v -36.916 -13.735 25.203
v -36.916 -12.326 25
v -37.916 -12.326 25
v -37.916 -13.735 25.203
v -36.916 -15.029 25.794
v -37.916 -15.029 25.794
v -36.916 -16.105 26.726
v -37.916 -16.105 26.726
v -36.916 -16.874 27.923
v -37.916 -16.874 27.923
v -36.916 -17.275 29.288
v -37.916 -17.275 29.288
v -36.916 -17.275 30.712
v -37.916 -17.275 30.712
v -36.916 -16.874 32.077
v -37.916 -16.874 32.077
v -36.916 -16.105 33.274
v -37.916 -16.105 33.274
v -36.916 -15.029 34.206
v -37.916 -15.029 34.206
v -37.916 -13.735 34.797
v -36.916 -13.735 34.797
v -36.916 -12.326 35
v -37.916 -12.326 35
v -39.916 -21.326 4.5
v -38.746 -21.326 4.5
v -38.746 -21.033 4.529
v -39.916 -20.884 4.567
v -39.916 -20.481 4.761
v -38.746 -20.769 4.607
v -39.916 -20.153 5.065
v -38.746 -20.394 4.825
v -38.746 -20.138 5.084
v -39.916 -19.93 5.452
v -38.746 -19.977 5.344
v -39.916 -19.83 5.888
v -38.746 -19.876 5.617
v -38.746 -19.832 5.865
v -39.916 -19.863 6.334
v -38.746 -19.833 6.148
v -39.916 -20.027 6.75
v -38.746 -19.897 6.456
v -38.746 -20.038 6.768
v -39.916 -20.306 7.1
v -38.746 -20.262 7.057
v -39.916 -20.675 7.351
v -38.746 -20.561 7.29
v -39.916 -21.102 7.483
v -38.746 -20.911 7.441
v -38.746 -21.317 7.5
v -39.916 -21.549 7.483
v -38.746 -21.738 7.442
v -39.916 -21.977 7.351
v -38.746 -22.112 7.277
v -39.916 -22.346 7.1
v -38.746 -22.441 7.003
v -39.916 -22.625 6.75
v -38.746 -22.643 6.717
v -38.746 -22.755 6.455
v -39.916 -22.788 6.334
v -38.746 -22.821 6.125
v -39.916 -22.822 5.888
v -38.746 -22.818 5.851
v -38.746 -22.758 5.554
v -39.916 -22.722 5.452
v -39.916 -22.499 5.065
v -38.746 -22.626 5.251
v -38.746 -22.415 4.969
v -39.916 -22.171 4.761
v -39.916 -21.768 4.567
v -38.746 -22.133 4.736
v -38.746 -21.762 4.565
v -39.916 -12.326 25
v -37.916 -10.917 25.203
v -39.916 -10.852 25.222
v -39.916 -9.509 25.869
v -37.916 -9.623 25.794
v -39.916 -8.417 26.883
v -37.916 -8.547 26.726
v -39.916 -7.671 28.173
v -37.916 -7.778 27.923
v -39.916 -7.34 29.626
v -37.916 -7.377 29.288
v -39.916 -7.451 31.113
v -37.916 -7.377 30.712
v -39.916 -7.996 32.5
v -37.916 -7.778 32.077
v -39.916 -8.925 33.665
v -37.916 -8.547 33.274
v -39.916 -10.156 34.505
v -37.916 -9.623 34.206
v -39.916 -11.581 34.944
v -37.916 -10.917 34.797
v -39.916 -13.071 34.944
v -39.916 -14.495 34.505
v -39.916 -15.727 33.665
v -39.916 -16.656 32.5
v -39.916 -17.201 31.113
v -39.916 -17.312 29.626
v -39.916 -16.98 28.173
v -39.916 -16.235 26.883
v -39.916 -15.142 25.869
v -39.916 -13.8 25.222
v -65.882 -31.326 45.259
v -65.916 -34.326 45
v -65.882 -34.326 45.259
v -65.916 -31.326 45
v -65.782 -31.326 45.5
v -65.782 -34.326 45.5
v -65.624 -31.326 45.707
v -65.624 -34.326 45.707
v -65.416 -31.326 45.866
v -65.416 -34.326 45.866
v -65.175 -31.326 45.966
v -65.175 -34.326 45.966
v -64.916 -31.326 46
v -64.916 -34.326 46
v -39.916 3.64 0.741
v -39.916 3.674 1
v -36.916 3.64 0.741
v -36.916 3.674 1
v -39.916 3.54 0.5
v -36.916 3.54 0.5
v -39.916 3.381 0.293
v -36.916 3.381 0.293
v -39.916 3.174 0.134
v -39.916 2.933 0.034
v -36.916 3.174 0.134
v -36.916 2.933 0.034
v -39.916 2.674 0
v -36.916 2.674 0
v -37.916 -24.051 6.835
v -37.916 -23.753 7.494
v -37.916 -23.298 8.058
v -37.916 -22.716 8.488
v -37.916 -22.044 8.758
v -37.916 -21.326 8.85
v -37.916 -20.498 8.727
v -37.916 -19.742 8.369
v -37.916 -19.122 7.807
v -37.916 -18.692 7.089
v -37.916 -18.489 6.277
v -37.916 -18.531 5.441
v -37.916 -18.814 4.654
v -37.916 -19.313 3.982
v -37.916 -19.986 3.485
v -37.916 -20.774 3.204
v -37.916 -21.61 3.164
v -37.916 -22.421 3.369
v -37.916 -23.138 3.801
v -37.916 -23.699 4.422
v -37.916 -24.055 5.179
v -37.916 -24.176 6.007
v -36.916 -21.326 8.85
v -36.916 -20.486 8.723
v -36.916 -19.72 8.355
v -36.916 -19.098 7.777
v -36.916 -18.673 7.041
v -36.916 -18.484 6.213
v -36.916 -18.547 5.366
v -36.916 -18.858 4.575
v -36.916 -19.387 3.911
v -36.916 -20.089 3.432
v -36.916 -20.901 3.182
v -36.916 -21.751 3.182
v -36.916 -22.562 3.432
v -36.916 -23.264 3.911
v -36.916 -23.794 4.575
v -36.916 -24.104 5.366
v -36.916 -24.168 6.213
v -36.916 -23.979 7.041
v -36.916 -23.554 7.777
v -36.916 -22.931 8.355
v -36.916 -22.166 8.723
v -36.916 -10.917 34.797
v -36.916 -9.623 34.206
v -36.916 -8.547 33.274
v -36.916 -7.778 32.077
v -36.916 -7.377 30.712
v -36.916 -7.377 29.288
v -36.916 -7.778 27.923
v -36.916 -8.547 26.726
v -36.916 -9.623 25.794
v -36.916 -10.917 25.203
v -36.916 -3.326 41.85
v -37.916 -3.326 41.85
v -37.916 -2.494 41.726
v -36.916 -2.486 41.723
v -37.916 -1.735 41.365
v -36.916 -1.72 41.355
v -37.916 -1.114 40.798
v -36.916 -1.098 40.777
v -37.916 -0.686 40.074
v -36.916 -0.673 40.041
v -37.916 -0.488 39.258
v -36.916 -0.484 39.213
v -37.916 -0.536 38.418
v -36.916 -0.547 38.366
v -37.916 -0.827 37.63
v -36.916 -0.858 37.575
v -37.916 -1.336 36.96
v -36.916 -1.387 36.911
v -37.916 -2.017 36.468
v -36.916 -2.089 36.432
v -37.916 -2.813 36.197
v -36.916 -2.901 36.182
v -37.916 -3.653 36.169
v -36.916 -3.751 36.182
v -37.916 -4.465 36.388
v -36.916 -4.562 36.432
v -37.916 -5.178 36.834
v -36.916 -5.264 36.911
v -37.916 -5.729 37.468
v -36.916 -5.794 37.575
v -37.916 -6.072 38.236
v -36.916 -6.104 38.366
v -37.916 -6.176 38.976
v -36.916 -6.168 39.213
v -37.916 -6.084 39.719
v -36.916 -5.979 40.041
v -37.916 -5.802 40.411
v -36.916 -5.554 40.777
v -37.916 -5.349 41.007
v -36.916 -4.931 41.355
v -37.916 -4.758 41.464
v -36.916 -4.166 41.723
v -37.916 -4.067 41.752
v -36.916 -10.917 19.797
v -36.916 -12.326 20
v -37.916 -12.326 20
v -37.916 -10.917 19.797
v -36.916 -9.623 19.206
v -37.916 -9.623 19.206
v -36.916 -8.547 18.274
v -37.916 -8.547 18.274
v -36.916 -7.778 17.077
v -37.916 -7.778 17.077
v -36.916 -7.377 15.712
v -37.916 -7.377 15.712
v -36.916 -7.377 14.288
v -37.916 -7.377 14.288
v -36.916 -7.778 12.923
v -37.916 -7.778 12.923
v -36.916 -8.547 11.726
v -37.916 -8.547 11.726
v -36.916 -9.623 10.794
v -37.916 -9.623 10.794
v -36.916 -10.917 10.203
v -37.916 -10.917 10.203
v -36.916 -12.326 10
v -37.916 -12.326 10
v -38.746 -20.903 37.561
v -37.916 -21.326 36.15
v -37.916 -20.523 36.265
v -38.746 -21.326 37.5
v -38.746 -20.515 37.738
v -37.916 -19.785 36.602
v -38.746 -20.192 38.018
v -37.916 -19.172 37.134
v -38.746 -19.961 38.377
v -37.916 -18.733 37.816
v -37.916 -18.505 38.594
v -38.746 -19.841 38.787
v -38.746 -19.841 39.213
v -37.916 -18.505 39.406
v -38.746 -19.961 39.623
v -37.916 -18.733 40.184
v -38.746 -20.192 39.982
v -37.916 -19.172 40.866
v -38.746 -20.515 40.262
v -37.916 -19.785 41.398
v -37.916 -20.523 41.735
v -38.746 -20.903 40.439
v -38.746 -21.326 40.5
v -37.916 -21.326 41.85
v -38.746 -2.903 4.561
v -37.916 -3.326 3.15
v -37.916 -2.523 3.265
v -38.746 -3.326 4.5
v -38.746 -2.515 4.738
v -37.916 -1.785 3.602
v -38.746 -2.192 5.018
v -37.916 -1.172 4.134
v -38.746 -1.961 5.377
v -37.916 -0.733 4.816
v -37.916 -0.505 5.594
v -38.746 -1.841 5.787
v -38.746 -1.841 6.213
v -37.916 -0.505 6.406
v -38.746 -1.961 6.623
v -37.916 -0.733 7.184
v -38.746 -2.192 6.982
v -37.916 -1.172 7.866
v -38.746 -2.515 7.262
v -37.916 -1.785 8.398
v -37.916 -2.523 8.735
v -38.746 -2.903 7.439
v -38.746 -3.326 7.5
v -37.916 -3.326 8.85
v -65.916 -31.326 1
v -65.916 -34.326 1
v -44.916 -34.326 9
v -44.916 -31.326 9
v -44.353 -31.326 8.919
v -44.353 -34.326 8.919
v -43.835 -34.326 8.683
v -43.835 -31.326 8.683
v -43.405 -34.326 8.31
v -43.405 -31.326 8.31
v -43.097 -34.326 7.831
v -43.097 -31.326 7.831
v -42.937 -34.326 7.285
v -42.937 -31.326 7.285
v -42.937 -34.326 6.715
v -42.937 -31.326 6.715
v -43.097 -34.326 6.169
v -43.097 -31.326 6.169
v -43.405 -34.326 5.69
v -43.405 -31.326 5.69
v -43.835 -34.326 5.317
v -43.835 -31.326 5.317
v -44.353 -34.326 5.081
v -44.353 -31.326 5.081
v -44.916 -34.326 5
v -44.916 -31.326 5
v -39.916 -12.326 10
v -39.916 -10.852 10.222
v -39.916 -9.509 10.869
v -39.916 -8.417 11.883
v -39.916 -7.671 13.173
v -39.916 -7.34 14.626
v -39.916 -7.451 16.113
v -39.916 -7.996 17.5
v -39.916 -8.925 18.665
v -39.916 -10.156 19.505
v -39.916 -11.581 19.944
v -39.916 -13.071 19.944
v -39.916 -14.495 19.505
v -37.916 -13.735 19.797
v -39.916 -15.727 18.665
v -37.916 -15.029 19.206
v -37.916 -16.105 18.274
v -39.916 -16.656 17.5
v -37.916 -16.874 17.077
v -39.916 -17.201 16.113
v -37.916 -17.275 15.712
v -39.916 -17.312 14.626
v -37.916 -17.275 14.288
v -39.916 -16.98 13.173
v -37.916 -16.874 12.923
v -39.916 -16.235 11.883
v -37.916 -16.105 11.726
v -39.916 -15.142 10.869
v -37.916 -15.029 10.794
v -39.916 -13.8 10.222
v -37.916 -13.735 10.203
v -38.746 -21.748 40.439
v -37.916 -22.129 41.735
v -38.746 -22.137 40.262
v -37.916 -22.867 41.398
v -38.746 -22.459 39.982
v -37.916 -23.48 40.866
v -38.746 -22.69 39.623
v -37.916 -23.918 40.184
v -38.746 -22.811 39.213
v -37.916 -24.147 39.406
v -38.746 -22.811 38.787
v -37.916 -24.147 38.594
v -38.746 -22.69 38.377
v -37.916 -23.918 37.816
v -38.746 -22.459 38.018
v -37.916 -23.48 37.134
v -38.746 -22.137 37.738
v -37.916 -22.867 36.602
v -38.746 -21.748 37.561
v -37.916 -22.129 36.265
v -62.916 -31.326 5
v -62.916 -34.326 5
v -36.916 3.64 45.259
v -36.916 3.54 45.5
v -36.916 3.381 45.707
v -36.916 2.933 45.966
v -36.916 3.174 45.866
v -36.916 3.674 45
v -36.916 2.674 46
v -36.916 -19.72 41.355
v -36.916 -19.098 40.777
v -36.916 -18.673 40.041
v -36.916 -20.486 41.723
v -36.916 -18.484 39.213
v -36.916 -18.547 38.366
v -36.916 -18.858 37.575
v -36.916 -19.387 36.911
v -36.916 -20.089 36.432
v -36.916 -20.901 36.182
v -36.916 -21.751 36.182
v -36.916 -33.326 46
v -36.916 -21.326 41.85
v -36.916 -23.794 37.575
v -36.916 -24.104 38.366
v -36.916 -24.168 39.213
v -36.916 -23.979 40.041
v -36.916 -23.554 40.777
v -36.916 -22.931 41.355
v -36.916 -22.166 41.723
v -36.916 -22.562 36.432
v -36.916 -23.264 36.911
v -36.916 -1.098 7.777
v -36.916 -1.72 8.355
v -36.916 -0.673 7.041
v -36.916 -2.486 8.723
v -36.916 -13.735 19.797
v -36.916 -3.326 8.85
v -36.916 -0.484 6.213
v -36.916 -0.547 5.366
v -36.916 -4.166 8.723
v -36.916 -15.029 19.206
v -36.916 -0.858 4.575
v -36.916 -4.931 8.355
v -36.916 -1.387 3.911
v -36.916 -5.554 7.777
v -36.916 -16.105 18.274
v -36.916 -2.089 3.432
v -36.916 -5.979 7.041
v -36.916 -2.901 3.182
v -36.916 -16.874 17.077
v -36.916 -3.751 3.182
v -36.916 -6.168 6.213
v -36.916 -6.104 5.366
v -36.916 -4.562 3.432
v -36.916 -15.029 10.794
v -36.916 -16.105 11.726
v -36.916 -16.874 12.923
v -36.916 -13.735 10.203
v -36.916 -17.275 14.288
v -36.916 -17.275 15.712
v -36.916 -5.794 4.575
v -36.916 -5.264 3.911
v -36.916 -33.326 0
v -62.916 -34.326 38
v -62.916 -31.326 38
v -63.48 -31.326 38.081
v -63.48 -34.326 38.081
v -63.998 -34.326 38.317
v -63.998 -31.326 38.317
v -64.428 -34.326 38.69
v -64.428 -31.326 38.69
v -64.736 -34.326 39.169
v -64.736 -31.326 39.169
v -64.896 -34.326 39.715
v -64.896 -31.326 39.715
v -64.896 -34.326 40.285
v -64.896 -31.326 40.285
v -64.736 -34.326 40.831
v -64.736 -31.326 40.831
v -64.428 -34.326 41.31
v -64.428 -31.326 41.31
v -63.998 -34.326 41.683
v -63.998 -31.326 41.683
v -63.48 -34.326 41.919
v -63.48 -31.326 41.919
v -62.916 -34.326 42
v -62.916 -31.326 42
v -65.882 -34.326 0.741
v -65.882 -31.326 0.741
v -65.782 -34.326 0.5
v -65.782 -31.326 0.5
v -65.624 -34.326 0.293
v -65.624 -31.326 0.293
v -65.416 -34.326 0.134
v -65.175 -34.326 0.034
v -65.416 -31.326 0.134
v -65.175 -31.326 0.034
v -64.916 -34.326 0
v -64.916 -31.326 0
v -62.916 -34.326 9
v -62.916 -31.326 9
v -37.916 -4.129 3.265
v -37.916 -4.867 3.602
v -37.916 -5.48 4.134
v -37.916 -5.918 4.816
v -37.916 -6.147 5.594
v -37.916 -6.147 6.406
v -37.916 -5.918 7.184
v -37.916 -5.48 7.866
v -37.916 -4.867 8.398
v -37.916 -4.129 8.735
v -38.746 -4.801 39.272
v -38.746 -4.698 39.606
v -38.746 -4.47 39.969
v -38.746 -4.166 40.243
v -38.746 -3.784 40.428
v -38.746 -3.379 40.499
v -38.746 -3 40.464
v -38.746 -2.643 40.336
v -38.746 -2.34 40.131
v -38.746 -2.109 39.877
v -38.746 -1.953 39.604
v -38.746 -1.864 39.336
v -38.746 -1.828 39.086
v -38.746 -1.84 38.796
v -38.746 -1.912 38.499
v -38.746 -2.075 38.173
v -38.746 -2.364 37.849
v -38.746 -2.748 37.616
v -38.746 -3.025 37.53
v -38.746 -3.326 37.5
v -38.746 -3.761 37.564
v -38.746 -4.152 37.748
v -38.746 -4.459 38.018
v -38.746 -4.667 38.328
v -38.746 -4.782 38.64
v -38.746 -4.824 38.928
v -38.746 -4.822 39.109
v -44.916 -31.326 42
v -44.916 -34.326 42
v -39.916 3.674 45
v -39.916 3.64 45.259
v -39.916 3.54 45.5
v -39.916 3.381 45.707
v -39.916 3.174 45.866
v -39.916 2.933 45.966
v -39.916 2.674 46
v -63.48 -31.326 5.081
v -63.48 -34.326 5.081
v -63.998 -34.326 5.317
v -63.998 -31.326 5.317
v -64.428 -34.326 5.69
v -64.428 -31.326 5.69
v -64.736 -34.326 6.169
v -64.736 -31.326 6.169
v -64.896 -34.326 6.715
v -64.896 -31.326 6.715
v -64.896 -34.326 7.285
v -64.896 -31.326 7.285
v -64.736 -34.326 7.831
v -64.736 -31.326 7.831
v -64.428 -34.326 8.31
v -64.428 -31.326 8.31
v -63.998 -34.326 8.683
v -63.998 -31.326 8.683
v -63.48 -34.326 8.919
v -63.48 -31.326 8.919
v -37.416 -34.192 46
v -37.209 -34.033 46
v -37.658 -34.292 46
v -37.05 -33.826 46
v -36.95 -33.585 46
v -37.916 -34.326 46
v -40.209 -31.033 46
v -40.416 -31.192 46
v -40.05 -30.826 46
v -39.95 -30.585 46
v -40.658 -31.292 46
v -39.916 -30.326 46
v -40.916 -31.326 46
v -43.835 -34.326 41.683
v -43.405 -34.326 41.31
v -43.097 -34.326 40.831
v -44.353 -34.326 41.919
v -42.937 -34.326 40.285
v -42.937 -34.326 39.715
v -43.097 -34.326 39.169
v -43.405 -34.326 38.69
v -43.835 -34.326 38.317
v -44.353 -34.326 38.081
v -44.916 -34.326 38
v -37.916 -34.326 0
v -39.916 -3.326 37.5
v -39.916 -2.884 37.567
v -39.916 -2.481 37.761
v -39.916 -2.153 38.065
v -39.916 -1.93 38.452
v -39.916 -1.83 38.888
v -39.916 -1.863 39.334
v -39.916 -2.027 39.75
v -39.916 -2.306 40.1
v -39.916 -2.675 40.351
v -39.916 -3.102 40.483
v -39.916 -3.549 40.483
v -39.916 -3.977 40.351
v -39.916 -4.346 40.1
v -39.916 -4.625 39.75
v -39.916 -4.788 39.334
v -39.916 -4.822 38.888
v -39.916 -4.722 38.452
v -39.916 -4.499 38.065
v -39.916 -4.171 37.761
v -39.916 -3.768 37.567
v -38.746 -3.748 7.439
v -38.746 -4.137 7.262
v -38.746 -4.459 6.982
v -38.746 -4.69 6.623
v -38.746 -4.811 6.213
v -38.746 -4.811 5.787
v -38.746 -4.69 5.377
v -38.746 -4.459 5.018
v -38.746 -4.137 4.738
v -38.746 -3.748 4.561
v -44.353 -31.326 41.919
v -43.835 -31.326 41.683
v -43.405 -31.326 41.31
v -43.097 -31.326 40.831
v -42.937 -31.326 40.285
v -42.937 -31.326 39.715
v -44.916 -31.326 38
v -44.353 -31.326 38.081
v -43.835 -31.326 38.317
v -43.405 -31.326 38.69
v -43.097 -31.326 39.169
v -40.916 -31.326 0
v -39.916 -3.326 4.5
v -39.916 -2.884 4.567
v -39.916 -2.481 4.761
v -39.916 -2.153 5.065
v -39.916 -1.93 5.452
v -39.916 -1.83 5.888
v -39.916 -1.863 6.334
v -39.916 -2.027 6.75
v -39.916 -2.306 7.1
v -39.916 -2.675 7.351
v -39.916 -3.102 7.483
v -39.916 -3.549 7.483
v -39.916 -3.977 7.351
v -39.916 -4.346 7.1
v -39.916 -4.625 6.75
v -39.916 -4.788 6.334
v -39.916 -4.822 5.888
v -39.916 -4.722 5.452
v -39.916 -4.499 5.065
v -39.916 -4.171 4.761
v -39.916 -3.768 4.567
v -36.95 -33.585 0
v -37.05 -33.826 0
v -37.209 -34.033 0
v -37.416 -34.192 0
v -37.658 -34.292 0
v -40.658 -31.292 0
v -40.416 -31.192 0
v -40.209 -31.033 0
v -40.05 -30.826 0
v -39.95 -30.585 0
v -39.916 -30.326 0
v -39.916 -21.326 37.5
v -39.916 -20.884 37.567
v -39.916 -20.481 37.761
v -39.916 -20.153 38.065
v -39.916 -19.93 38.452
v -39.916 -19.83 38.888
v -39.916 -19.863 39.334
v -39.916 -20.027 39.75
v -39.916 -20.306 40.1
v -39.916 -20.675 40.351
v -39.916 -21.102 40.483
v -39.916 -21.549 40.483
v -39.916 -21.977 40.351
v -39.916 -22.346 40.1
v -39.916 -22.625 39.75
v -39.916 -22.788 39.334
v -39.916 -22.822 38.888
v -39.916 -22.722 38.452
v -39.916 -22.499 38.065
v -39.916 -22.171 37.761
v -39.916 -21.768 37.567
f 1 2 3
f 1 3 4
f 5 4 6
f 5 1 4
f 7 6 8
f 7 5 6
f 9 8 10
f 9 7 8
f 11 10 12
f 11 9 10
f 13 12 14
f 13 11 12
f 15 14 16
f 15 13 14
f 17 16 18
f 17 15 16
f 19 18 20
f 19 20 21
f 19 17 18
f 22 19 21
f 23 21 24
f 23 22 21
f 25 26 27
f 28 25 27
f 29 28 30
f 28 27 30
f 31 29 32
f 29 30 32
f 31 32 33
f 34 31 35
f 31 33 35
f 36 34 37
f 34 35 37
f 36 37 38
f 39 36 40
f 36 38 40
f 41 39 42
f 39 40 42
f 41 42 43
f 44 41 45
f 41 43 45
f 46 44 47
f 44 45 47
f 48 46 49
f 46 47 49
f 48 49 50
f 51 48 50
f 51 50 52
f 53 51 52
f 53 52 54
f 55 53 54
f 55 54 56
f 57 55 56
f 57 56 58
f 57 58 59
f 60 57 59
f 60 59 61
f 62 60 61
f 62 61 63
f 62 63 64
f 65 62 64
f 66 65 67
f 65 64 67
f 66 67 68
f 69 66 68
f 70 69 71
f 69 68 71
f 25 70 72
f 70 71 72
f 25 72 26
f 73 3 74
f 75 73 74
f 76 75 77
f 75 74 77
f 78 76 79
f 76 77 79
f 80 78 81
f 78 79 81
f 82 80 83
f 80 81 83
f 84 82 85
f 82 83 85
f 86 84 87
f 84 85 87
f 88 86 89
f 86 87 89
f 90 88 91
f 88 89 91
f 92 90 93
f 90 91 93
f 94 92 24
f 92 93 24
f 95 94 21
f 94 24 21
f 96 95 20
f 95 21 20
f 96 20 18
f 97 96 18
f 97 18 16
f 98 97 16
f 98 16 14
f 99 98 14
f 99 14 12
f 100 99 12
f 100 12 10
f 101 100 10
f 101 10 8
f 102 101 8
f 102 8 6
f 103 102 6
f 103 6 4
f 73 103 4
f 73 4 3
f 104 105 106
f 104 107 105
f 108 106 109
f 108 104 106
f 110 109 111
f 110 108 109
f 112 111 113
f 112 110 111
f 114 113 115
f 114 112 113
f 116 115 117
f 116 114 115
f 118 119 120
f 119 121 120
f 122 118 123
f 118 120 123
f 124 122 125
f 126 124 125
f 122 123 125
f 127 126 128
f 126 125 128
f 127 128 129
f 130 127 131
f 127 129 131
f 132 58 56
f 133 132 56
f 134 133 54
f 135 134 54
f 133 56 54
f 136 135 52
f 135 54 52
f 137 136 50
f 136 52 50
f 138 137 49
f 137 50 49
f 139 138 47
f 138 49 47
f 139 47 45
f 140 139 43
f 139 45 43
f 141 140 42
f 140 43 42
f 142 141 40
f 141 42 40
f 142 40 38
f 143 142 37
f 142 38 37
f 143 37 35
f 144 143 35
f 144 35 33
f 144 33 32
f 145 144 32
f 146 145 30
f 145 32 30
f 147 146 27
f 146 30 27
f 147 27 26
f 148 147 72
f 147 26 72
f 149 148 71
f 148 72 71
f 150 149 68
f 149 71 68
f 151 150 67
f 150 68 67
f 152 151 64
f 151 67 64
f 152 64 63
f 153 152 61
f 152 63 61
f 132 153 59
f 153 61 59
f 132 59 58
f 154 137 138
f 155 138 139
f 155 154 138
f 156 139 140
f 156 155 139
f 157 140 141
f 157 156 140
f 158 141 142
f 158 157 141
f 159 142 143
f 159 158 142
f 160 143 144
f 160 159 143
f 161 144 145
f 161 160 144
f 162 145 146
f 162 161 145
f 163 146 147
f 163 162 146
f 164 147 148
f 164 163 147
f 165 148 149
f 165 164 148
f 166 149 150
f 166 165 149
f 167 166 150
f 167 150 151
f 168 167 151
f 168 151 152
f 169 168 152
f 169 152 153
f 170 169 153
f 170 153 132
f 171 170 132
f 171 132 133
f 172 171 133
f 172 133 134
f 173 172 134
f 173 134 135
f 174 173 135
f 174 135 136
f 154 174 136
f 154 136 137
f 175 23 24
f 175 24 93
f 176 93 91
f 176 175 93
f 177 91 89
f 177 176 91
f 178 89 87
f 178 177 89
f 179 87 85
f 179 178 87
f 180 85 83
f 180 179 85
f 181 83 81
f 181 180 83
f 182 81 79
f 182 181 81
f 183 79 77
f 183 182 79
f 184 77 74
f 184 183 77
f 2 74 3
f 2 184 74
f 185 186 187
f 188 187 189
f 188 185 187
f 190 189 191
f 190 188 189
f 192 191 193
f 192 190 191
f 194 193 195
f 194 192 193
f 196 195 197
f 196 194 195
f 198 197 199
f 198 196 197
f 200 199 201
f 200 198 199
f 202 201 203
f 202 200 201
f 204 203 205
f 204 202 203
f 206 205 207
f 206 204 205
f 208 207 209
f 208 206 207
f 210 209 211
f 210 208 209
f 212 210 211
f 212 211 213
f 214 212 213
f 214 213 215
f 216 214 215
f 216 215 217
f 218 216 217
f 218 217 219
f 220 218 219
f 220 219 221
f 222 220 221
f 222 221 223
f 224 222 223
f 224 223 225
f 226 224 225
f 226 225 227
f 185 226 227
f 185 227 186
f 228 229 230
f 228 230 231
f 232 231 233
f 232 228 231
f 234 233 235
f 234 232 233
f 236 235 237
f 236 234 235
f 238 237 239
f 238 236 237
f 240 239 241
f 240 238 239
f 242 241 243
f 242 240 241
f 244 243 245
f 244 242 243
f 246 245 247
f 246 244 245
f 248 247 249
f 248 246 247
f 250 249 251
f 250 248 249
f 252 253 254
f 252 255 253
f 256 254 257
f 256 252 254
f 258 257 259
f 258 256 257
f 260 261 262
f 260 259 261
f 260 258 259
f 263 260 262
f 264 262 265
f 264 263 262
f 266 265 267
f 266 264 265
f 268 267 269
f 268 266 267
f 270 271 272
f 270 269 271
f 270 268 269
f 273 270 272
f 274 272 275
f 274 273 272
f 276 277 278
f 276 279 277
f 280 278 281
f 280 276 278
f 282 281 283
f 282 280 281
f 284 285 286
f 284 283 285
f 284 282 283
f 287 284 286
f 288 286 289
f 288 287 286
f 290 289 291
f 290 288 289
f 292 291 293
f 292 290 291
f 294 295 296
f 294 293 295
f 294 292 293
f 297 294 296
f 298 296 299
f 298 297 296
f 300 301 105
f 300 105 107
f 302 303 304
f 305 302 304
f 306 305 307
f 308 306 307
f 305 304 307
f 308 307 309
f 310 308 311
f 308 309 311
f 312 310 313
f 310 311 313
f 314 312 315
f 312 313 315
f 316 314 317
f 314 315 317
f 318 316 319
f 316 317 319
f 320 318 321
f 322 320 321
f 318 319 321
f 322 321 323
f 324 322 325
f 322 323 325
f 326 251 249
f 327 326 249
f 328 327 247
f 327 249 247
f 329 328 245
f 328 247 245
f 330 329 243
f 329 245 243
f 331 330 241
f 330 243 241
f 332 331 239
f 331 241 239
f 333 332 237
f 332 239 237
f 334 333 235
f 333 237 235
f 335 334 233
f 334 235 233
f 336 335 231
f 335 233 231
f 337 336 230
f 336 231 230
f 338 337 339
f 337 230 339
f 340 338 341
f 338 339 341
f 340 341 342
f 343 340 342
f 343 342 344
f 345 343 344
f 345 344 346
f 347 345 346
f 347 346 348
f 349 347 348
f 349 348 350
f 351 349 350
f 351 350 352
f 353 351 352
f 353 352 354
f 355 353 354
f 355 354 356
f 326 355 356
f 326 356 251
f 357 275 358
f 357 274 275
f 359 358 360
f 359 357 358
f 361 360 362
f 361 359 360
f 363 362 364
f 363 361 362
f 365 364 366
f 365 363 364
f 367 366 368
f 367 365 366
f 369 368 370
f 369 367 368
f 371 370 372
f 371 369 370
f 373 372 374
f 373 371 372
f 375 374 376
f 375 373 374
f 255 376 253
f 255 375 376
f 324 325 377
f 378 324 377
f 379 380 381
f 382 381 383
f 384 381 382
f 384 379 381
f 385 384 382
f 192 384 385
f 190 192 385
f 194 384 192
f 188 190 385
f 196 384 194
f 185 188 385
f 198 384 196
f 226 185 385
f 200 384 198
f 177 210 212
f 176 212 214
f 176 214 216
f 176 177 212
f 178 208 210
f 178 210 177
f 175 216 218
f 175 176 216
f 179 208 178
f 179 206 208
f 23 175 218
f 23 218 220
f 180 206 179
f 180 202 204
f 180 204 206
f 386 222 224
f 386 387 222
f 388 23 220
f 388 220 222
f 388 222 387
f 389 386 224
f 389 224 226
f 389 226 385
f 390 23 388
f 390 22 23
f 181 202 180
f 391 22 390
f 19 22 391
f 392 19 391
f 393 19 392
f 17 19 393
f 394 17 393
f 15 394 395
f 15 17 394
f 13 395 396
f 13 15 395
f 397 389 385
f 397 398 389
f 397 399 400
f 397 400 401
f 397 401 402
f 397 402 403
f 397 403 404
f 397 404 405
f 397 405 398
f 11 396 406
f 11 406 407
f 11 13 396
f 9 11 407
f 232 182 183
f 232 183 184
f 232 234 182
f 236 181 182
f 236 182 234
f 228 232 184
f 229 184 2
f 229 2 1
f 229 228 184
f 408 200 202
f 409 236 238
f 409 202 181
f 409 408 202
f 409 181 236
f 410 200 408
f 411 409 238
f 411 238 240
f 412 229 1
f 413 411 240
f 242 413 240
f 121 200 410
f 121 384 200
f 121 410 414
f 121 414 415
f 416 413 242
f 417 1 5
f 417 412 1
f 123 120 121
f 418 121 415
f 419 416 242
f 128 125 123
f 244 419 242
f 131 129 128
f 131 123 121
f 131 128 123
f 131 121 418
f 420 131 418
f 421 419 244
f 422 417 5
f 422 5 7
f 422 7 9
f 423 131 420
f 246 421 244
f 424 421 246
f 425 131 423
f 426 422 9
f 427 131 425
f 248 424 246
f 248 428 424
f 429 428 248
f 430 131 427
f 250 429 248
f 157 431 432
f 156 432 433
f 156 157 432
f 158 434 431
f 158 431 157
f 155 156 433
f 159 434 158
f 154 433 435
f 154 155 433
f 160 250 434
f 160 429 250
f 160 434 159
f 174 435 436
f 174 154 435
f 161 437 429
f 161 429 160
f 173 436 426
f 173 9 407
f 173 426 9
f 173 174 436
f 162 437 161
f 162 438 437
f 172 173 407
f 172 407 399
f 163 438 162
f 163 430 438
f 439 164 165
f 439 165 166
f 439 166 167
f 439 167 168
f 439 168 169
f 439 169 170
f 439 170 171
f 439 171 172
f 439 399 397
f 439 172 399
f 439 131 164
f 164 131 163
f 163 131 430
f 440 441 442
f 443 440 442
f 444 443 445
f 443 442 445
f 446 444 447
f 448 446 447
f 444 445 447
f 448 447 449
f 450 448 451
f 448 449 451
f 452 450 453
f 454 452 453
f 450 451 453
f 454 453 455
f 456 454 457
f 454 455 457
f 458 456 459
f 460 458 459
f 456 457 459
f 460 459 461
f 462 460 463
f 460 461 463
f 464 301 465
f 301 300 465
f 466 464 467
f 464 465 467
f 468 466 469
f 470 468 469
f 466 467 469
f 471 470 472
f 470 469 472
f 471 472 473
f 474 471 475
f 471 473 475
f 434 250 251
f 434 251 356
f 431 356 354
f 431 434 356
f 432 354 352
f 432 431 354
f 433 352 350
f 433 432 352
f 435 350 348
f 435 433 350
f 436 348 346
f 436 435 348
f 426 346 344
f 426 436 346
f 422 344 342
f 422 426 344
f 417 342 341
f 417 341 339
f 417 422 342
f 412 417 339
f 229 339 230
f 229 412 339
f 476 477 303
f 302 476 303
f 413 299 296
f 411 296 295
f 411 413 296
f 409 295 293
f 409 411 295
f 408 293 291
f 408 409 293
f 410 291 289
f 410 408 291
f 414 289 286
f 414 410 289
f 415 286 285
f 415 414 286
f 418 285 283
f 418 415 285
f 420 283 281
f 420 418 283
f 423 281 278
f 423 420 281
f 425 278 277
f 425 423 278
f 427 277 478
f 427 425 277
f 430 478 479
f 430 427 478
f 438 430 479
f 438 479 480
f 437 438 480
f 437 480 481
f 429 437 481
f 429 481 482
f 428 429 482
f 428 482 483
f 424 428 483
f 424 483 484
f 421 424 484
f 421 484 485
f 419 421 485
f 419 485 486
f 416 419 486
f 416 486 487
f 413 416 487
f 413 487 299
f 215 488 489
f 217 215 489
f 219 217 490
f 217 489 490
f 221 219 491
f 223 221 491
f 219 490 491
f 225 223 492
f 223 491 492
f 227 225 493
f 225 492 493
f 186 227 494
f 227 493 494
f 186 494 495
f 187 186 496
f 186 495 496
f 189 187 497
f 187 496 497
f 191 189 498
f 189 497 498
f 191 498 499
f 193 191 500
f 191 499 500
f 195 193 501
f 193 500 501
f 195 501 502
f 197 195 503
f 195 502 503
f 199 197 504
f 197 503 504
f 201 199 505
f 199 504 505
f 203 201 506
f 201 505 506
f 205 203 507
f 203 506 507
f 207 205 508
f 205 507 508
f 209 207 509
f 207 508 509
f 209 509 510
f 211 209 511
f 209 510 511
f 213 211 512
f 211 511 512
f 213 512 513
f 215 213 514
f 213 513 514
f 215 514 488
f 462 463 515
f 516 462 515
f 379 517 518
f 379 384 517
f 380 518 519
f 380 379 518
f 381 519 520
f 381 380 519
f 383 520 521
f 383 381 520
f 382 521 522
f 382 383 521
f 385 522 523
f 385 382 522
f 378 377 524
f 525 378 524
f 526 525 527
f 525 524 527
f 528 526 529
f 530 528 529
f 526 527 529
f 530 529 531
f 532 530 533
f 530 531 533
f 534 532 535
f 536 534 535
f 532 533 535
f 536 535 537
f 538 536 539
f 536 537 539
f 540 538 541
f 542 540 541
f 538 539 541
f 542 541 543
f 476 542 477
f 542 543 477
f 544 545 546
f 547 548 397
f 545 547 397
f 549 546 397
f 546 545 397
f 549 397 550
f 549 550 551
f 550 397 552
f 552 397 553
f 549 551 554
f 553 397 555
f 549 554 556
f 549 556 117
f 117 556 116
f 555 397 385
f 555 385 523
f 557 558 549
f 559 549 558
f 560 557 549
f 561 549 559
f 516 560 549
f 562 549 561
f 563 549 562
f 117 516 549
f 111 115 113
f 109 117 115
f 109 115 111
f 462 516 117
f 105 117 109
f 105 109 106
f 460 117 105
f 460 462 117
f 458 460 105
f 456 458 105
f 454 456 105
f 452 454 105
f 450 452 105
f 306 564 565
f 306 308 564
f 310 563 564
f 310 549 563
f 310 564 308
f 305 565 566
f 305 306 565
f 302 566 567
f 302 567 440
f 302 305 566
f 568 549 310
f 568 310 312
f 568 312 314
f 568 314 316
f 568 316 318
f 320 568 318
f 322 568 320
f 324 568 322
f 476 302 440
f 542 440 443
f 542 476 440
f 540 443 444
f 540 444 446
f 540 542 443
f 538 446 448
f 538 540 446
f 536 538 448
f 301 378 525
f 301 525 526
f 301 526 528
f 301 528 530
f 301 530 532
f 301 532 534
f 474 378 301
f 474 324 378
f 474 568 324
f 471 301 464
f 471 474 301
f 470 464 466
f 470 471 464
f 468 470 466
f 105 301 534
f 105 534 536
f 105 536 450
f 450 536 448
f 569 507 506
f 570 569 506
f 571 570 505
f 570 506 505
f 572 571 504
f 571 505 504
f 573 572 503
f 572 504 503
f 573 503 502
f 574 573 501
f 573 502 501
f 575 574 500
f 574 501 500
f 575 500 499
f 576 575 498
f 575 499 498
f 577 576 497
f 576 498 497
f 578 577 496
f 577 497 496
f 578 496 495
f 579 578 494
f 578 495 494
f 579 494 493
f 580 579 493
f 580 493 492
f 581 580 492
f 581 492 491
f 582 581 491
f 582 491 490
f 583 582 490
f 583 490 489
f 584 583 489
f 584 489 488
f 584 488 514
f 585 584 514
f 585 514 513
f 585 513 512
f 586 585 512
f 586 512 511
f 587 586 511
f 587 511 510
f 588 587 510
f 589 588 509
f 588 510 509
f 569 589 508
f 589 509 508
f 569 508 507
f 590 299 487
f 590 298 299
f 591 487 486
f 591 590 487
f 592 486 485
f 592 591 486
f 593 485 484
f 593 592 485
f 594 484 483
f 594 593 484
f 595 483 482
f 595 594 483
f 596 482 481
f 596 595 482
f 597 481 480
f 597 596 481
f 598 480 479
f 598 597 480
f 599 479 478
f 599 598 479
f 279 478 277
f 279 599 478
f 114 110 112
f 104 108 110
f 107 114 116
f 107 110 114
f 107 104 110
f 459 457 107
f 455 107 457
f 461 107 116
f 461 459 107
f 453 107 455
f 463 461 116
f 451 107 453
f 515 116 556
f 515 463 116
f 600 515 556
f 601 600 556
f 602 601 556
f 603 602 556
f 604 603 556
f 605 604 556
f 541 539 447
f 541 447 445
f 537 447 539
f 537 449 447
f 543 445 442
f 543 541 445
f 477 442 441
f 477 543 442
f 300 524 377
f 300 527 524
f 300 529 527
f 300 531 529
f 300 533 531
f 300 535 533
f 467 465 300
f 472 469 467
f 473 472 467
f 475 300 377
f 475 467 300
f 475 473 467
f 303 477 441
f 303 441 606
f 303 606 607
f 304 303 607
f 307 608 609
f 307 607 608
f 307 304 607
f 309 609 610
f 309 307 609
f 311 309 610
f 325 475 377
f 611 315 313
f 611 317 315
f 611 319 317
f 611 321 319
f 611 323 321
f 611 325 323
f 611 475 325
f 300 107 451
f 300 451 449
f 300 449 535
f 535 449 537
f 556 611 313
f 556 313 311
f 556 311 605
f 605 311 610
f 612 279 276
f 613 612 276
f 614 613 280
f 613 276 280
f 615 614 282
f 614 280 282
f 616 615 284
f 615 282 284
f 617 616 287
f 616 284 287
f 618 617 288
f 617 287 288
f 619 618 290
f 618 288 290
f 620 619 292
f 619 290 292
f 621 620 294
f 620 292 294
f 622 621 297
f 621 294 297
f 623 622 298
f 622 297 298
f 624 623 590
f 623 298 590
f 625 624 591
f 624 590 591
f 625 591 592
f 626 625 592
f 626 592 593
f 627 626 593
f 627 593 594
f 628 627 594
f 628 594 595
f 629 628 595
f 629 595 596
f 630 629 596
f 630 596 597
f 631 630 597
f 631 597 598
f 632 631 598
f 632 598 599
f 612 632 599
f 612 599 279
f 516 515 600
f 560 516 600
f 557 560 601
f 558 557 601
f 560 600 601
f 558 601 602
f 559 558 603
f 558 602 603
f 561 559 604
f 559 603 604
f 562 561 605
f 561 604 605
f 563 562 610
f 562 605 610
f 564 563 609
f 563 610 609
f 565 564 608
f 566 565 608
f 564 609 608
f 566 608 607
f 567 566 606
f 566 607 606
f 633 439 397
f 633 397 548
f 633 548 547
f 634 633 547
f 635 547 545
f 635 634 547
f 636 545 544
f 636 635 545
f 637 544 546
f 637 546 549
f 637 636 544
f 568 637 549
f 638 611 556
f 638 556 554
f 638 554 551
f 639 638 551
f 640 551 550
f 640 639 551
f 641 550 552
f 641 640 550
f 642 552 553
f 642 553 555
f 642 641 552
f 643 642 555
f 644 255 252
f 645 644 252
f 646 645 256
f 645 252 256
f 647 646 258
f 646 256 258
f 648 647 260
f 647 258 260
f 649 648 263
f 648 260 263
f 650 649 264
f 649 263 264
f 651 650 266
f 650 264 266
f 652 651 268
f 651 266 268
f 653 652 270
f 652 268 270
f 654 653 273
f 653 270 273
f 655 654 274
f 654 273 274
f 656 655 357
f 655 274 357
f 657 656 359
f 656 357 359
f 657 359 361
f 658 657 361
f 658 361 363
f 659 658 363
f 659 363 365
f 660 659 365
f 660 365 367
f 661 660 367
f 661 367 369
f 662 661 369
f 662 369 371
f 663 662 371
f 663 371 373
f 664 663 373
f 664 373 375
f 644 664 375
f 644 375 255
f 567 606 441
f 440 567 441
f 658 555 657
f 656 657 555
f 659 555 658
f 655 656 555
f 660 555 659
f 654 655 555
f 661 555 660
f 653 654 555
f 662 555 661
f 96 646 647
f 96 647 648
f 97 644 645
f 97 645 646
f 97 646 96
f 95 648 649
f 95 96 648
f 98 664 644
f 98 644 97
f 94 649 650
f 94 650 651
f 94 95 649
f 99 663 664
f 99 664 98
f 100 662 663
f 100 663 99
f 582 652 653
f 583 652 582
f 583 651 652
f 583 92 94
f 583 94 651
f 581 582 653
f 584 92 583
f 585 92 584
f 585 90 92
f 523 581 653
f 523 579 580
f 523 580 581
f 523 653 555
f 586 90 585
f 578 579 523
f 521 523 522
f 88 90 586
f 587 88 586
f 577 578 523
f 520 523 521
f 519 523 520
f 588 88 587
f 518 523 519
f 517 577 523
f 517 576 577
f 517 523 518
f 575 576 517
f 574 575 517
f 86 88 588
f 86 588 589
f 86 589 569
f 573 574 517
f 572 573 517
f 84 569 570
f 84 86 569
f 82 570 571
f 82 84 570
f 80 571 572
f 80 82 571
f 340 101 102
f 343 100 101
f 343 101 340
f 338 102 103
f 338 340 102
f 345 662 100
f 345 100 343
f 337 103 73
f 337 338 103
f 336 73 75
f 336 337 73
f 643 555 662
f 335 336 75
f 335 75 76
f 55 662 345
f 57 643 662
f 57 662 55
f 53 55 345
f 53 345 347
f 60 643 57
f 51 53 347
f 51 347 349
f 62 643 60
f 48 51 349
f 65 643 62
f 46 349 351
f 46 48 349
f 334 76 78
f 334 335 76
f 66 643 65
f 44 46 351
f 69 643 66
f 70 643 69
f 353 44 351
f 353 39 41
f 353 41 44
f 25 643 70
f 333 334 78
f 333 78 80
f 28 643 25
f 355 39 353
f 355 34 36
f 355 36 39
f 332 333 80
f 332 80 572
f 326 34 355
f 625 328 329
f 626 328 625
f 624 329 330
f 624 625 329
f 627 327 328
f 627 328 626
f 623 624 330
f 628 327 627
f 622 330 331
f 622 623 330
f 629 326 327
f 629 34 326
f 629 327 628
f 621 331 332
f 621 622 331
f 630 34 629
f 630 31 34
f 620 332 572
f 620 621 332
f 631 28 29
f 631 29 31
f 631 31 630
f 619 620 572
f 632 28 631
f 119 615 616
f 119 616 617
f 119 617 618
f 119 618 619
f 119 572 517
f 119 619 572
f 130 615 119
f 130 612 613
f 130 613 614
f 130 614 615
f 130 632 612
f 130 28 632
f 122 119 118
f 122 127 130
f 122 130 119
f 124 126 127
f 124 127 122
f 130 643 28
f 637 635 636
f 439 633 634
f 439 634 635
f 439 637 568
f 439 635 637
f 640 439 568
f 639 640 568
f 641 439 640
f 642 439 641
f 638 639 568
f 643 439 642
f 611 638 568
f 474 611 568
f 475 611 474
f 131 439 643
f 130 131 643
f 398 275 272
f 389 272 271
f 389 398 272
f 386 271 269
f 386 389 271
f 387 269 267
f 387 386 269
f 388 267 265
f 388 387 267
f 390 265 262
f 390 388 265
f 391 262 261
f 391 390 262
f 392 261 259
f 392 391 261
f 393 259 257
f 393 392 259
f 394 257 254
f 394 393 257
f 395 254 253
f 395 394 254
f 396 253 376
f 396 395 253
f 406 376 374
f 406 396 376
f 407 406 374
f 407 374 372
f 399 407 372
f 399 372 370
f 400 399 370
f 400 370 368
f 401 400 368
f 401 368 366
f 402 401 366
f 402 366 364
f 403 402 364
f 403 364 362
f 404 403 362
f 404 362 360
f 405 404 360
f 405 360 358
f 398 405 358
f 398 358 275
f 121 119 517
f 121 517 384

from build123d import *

# Parameters (mm, degrees)
SALIENTE_EXTRUIR1_DEPTH = 46
REDONDEO1_R             = 1
CROQUIS2_R              = 2.85
CROQUIS2_R_2            = 5
CORTAR_EXTRUIR1_DEPTH   = 1
CORTAR_EXTRUIR2_DEPTH   = 88.669687299
CROQUIS6_R              = 5
CORTAR_EXTRUIR3_DEPTH   = 65.306026243
CROQUIS7_3_R            = 1.5
CROQUIS7_5_R            = 1.5
CROQUIS7_6_R            = 1.5
CORTAR_EXTRUIR4_DEPTH   = 64.501763056


with BuildPart() as part:
    # Croquis1 → Saliente-Extruir1 (new body)
    with BuildSketch(Plane.XY):
        with BuildLine():
            Line((-36.916417311, 3.674134953), (-36.916417311, -33.325865047))
            ThreePointArc((-36.916417311, -33.325865047), (-37.20931053, -34.032971828), (-37.916417311, -34.325865047))
            Line((-37.916417311, -34.325865047), (-65.916417311, -34.325865047))
            Line((-65.916417311, -34.325865047), (-65.916417311, -31.325865047))
            Line((-65.916417311, -31.325865047), (-40.916417311, -31.325865047))
            ThreePointArc((-40.916417311, -31.325865047), (-40.20931053, -31.032971828), (-39.916417311, -30.325865047))
            Line((-39.916417311, -30.325865047), (-39.916417311, 3.674134953))
            Line((-39.916417311, 3.674134953), (-36.916417311, 3.674134953))
        make_face()
    extrude(amount=SALIENTE_EXTRUIR1_DEPTH)

    # Redondeo1
    redondeo1_edges = [part.edges().sort_by_distance(p)[0] for p in [
        (-38.416417311, 3.674134953, 0),
        (-65.916417311, -32.825865047, 46),
        (-38.416417311, 3.674134953, 46),
        (-65.916417311, -32.825865047, 0),
    ]]
    fillet(redondeo1_edges, radius=REDONDEO1_R)

    # Croquis2 → Cortar-Extruir1 (cut)
    with BuildSketch(Plane.ZY.offset(36.916417311)):
        with Locations((6, -3.325865047)):
            Circle(CROQUIS2_R)
        with Locations((39, -3.325865047)):
            Circle(CROQUIS2_R)
        with Locations((6, -21.325865047)):
            Circle(CROQUIS2_R)
        with Locations((39, -21.325865047)):
            Circle(CROQUIS2_R)
        with Locations((15, -12.325865047)):
            Circle(CROQUIS2_R_2)
        with Locations((30, -12.325865047)):
            Circle(CROQUIS2_R_2)
    extrude(amount=CORTAR_EXTRUIR1_DEPTH, mode=Mode.SUBTRACT)

    # Croquis3 → Cortar-Extruir2 (cut, through all)
    with BuildSketch(Plane(origin=(0, -31.325865047, 0), x_dir=(1, 0, 0), z_dir=(0, 1, 0))):
        with BuildLine():
            Line((-62.916417311, -42), (-44.916417311, -42))
            ThreePointArc((-44.916417311, -42), (-42.916417311, -40), (-44.916417311, -38))
            Line((-44.916417311, -38), (-62.916417311, -38))
            ThreePointArc((-62.916417311, -38), (-64.916417311, -40), (-62.916417311, -42))
        make_face()
        with BuildLine():
            Line((-62.916417311, -9), (-44.916417311, -9))
            ThreePointArc((-44.916417311, -9), (-42.916417311, -7), (-44.916417311, -5))
            Line((-44.916417311, -5), (-62.916417311, -5))
            ThreePointArc((-62.916417311, -5), (-64.916417311, -7), (-62.916417311, -9))
        make_face()
    extrude(amount=-CORTAR_EXTRUIR2_DEPTH, mode=Mode.SUBTRACT)

    # Croquis6 → Cortar-Extruir3 (cut, through all)
    with BuildSketch(Plane(origin=(-36.916417311, 0, 0), x_dir=(0, 0, -1), z_dir=(1, 0, 0))):
        with Locations((-30, -12.325865047)):
            Circle(CROQUIS6_R)
        with Locations((-15, -12.325865047)):
            Circle(CROQUIS6_R)
    extrude(amount=-CORTAR_EXTRUIR3_DEPTH, mode=Mode.SUBTRACT)

    # Cortar-Recubrir1: read off the stored shape, not the designer's step
    # Cortar-Recubrir1: loft between two sections, ruled curve by curve
    cortar_recubrir1_from = [
        Edge.make_bspline([(-37.916417311, -6.071519474, 38.235878437), (-37.916417311, -7.599762601, 43.727187292), (-37.916417311, -2.108453745, 45.255430419), (-37.916417311, -0.580210619, 39.764121563), (-37.916417311, 0.948032507, 34.272812708), (-37.916417311, -4.543276348, 32.744569581), (-37.916417311, -6.071519474, 38.235878437)], [0, 0, 0, 0, 0.5, 0.5, 0.5, 1, 1, 1, 1], 3, [1, 0.333333333, 0.333333333, 1, 0.333333333, 0.333333333, 1]),
    ]
    cortar_recubrir1_to = [
        Edge.make_bspline([(-38.746417311, -4.801032854, 39.271808645), (-38.746417311, -4.257415563, 42.22214426), (-38.746417311, -1.307079948, 41.67852697), (-38.746417311, -1.850697239, 38.728191355), (-38.746417311, -2.39431453, 35.77785574), (-38.746417311, -5.344650145, 36.32147303), (-38.746417311, -4.801032854, 39.271808645)], [0, 0, 0, 0, 0.5, 0.5, 0.5, 1, 1, 1, 1], 3, [1, 0.333333333, 0.333333333, 1, 0.333333333, 0.333333333, 1]),
    ]
    cortar_recubrir1 = Solid(Shell([*[Face.make_surface_from_curves(cortar_recubrir1_from[k], cortar_recubrir1_to[k]) for k in range(1)], Face(Wire(cortar_recubrir1_from)), Face(Wire(cortar_recubrir1_to))]))
    add(cortar_recubrir1, mode=Mode.SUBTRACT)

    # Croquis7<3> → section 1 of cortar_recubrir2
    with BuildSketch(Plane(origin=(-38.746417311, 0, 0), x_dir=(0, 0, -1), z_dir=(1, 0, 0)), mode=Mode.PRIVATE) as cortar_recubrir2_s1:
        with Locations((-39, -21.325865047)):
            Circle(CROQUIS7_3_R)
    # loft up to a face of the part (cortar_recubrir2)
    loft([Face(Wire([part.edges().sort_by_distance((-37.916417311, -23.403425635, 37.049040748))[0]])), cortar_recubrir2_s1.sketch], mode=Mode.SUBTRACT)

    # Cortar-Recubrir3: read off the stored shape, not the designer's step
    # Cortar-Recubrir3: loft between two sections, ruled curve by curve
    cortar_recubrir3_from = [
        Edge.make_bspline([(-37.916417311, -24.050926068, 6.834591174), (-37.916417311, -22.38174372, 12.284713218), (-37.916417311, -16.931621677, 10.615530869), (-37.916417311, -18.600804025, 5.165408826), (-37.916417311, -20.269986373, -0.284713218), (-37.916417311, -25.720108417, 1.384469131), (-37.916417311, -24.050926068, 6.834591174)], [0, 0, 0, 0, 0.5, 0.5, 0.5, 1, 1, 1, 1], 3, [1, 0.333333333, 0.333333333, 1, 0.333333333, 0.333333333, 1]),
    ]
    cortar_recubrir3_to = [
        Edge.make_bspline([(-38.746417311, -22.643490638, 6.716842243), (-38.746417311, -21.209806151, 9.352093425), (-38.746417311, -18.574554969, 7.918408939), (-38.746417311, -20.008239456, 5.283157757), (-38.746417311, -21.441923942, 2.647906575), (-38.746417311, -24.077175124, 4.081591061), (-38.746417311, -22.643490638, 6.716842243)], [0, 0, 0, 0, 0.5, 0.5, 0.5, 1, 1, 1, 1], 3, [1, 0.333333333, 0.333333333, 1, 0.333333333, 0.333333333, 1]),
    ]
    cortar_recubrir3 = Solid(Shell([*[Face.make_surface_from_curves(cortar_recubrir3_from[k], cortar_recubrir3_to[k]) for k in range(1)], Face(Wire(cortar_recubrir3_from)), Face(Wire(cortar_recubrir3_to))]))
    add(cortar_recubrir3, mode=Mode.SUBTRACT)

    # Croquis7<5> → section 1 of cortar_recubrir4
    with BuildSketch(Plane(origin=(-38.746417311, 0, 0), x_dir=(0, 0, -1), z_dir=(1, 0, 0)), mode=Mode.PRIVATE) as cortar_recubrir4_s1:
        with Locations((-6, -3.325865047)):
            Circle(CROQUIS7_5_R)
    # loft up to a face of the part (cortar_recubrir4)
    loft([Face(Wire([part.edges().sort_by_distance((-37.916417311, -5.403425635, 4.049040748))[0]])), cortar_recubrir4_s1.sketch], mode=Mode.SUBTRACT)

    # Croquis7<6> → Cortar-Extruir4 (cut, through all)
    with BuildSketch(Plane(origin=(-38.746417311, 0, 0), x_dir=(0, 0, -1), z_dir=(1, 0, 0))):
        with Locations((-39, -3.325865047)):
            Circle(CROQUIS7_6_R)
        with Locations((-39, -21.325865047)):
            Circle(CROQUIS7_6_R)
        with Locations((-6, -21.325865047)):
            Circle(CROQUIS7_6_R)
        with Locations((-6, -3.325865047)):
            Circle(CROQUIS7_6_R)
    extrude(amount=-CORTAR_EXTRUIR4_DEPTH, mode=Mode.SUBTRACT)


solid = part.part
